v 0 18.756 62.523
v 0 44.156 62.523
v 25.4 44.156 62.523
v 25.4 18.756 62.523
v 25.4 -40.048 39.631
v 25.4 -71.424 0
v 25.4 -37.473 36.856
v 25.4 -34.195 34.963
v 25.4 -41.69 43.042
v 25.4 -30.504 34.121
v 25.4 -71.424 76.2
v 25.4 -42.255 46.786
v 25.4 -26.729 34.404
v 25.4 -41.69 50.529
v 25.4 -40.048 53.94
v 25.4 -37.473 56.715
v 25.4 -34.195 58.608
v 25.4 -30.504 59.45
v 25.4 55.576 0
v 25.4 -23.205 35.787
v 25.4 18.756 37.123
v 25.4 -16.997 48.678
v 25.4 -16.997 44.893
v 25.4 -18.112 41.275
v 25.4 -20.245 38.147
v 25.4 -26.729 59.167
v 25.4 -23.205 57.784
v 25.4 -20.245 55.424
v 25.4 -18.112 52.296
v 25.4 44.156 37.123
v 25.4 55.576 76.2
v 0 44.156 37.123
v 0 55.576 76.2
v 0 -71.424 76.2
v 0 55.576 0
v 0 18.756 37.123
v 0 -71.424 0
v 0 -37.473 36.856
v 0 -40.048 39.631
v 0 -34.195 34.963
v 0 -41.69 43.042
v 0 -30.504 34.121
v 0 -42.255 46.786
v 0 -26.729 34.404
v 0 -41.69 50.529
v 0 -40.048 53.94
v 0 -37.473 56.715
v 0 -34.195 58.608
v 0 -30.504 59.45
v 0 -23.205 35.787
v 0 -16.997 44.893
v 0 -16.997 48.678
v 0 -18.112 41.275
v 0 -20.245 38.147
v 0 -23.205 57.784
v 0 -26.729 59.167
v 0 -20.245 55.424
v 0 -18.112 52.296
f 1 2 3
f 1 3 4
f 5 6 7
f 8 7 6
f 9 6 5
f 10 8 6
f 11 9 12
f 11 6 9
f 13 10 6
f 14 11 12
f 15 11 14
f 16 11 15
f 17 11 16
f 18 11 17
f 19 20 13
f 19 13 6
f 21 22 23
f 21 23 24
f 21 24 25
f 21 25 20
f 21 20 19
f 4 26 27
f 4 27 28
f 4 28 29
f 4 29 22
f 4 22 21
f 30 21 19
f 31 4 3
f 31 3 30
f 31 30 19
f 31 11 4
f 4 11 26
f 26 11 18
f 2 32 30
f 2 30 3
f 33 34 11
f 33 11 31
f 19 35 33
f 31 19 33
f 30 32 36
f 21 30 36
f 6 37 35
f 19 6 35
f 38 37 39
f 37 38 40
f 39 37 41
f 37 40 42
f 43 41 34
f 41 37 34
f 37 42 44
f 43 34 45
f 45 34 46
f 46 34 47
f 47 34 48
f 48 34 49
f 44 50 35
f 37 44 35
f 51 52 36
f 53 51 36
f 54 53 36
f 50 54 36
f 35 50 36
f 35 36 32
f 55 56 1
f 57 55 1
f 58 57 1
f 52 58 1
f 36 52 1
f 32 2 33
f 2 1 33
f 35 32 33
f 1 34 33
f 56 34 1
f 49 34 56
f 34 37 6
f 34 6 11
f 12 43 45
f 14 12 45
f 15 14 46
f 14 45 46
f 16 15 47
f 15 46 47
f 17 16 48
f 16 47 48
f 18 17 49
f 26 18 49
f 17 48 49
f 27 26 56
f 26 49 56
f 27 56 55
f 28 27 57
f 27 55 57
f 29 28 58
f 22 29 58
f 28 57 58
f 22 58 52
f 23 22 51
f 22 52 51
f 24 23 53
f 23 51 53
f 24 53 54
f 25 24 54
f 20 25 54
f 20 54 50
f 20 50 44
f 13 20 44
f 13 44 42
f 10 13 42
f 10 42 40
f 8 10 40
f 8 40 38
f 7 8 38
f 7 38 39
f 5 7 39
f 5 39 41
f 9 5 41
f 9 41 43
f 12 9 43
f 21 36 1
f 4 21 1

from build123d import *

# Parameters (mm, degrees)
F0_W     = 127
F0_H     = 76.2
F1_DEPTH = 25.4
F2_W     = 25.4
F2_H     = 25.4
F2_R     = 12.7
F3_DEPTH = 2540


with BuildPart() as f1:
    # F0 (on Right) → F1 (new body)
    with BuildSketch(Plane.YZ):
        with Locations((-7.924328, 38.1)):
            Rectangle(F0_W, F0_H)
    extrude(amount=F1_DEPTH)

    # F2 (on face) → F3 (cut)
    with BuildSketch(Plane(origin=(0, 0, 0), x_dir=(0, -1, 0), z_dir=(-1, 0, 0))):
        with Locations((-31.45644, 49.823285)):
            Rectangle(F2_W, F2_H)
        with Locations((29.554684, 46.785511)):
            Circle(F2_R)
    extrude(amount=-F3_DEPTH, mode=Mode.SUBTRACT)


solid = f1.part
